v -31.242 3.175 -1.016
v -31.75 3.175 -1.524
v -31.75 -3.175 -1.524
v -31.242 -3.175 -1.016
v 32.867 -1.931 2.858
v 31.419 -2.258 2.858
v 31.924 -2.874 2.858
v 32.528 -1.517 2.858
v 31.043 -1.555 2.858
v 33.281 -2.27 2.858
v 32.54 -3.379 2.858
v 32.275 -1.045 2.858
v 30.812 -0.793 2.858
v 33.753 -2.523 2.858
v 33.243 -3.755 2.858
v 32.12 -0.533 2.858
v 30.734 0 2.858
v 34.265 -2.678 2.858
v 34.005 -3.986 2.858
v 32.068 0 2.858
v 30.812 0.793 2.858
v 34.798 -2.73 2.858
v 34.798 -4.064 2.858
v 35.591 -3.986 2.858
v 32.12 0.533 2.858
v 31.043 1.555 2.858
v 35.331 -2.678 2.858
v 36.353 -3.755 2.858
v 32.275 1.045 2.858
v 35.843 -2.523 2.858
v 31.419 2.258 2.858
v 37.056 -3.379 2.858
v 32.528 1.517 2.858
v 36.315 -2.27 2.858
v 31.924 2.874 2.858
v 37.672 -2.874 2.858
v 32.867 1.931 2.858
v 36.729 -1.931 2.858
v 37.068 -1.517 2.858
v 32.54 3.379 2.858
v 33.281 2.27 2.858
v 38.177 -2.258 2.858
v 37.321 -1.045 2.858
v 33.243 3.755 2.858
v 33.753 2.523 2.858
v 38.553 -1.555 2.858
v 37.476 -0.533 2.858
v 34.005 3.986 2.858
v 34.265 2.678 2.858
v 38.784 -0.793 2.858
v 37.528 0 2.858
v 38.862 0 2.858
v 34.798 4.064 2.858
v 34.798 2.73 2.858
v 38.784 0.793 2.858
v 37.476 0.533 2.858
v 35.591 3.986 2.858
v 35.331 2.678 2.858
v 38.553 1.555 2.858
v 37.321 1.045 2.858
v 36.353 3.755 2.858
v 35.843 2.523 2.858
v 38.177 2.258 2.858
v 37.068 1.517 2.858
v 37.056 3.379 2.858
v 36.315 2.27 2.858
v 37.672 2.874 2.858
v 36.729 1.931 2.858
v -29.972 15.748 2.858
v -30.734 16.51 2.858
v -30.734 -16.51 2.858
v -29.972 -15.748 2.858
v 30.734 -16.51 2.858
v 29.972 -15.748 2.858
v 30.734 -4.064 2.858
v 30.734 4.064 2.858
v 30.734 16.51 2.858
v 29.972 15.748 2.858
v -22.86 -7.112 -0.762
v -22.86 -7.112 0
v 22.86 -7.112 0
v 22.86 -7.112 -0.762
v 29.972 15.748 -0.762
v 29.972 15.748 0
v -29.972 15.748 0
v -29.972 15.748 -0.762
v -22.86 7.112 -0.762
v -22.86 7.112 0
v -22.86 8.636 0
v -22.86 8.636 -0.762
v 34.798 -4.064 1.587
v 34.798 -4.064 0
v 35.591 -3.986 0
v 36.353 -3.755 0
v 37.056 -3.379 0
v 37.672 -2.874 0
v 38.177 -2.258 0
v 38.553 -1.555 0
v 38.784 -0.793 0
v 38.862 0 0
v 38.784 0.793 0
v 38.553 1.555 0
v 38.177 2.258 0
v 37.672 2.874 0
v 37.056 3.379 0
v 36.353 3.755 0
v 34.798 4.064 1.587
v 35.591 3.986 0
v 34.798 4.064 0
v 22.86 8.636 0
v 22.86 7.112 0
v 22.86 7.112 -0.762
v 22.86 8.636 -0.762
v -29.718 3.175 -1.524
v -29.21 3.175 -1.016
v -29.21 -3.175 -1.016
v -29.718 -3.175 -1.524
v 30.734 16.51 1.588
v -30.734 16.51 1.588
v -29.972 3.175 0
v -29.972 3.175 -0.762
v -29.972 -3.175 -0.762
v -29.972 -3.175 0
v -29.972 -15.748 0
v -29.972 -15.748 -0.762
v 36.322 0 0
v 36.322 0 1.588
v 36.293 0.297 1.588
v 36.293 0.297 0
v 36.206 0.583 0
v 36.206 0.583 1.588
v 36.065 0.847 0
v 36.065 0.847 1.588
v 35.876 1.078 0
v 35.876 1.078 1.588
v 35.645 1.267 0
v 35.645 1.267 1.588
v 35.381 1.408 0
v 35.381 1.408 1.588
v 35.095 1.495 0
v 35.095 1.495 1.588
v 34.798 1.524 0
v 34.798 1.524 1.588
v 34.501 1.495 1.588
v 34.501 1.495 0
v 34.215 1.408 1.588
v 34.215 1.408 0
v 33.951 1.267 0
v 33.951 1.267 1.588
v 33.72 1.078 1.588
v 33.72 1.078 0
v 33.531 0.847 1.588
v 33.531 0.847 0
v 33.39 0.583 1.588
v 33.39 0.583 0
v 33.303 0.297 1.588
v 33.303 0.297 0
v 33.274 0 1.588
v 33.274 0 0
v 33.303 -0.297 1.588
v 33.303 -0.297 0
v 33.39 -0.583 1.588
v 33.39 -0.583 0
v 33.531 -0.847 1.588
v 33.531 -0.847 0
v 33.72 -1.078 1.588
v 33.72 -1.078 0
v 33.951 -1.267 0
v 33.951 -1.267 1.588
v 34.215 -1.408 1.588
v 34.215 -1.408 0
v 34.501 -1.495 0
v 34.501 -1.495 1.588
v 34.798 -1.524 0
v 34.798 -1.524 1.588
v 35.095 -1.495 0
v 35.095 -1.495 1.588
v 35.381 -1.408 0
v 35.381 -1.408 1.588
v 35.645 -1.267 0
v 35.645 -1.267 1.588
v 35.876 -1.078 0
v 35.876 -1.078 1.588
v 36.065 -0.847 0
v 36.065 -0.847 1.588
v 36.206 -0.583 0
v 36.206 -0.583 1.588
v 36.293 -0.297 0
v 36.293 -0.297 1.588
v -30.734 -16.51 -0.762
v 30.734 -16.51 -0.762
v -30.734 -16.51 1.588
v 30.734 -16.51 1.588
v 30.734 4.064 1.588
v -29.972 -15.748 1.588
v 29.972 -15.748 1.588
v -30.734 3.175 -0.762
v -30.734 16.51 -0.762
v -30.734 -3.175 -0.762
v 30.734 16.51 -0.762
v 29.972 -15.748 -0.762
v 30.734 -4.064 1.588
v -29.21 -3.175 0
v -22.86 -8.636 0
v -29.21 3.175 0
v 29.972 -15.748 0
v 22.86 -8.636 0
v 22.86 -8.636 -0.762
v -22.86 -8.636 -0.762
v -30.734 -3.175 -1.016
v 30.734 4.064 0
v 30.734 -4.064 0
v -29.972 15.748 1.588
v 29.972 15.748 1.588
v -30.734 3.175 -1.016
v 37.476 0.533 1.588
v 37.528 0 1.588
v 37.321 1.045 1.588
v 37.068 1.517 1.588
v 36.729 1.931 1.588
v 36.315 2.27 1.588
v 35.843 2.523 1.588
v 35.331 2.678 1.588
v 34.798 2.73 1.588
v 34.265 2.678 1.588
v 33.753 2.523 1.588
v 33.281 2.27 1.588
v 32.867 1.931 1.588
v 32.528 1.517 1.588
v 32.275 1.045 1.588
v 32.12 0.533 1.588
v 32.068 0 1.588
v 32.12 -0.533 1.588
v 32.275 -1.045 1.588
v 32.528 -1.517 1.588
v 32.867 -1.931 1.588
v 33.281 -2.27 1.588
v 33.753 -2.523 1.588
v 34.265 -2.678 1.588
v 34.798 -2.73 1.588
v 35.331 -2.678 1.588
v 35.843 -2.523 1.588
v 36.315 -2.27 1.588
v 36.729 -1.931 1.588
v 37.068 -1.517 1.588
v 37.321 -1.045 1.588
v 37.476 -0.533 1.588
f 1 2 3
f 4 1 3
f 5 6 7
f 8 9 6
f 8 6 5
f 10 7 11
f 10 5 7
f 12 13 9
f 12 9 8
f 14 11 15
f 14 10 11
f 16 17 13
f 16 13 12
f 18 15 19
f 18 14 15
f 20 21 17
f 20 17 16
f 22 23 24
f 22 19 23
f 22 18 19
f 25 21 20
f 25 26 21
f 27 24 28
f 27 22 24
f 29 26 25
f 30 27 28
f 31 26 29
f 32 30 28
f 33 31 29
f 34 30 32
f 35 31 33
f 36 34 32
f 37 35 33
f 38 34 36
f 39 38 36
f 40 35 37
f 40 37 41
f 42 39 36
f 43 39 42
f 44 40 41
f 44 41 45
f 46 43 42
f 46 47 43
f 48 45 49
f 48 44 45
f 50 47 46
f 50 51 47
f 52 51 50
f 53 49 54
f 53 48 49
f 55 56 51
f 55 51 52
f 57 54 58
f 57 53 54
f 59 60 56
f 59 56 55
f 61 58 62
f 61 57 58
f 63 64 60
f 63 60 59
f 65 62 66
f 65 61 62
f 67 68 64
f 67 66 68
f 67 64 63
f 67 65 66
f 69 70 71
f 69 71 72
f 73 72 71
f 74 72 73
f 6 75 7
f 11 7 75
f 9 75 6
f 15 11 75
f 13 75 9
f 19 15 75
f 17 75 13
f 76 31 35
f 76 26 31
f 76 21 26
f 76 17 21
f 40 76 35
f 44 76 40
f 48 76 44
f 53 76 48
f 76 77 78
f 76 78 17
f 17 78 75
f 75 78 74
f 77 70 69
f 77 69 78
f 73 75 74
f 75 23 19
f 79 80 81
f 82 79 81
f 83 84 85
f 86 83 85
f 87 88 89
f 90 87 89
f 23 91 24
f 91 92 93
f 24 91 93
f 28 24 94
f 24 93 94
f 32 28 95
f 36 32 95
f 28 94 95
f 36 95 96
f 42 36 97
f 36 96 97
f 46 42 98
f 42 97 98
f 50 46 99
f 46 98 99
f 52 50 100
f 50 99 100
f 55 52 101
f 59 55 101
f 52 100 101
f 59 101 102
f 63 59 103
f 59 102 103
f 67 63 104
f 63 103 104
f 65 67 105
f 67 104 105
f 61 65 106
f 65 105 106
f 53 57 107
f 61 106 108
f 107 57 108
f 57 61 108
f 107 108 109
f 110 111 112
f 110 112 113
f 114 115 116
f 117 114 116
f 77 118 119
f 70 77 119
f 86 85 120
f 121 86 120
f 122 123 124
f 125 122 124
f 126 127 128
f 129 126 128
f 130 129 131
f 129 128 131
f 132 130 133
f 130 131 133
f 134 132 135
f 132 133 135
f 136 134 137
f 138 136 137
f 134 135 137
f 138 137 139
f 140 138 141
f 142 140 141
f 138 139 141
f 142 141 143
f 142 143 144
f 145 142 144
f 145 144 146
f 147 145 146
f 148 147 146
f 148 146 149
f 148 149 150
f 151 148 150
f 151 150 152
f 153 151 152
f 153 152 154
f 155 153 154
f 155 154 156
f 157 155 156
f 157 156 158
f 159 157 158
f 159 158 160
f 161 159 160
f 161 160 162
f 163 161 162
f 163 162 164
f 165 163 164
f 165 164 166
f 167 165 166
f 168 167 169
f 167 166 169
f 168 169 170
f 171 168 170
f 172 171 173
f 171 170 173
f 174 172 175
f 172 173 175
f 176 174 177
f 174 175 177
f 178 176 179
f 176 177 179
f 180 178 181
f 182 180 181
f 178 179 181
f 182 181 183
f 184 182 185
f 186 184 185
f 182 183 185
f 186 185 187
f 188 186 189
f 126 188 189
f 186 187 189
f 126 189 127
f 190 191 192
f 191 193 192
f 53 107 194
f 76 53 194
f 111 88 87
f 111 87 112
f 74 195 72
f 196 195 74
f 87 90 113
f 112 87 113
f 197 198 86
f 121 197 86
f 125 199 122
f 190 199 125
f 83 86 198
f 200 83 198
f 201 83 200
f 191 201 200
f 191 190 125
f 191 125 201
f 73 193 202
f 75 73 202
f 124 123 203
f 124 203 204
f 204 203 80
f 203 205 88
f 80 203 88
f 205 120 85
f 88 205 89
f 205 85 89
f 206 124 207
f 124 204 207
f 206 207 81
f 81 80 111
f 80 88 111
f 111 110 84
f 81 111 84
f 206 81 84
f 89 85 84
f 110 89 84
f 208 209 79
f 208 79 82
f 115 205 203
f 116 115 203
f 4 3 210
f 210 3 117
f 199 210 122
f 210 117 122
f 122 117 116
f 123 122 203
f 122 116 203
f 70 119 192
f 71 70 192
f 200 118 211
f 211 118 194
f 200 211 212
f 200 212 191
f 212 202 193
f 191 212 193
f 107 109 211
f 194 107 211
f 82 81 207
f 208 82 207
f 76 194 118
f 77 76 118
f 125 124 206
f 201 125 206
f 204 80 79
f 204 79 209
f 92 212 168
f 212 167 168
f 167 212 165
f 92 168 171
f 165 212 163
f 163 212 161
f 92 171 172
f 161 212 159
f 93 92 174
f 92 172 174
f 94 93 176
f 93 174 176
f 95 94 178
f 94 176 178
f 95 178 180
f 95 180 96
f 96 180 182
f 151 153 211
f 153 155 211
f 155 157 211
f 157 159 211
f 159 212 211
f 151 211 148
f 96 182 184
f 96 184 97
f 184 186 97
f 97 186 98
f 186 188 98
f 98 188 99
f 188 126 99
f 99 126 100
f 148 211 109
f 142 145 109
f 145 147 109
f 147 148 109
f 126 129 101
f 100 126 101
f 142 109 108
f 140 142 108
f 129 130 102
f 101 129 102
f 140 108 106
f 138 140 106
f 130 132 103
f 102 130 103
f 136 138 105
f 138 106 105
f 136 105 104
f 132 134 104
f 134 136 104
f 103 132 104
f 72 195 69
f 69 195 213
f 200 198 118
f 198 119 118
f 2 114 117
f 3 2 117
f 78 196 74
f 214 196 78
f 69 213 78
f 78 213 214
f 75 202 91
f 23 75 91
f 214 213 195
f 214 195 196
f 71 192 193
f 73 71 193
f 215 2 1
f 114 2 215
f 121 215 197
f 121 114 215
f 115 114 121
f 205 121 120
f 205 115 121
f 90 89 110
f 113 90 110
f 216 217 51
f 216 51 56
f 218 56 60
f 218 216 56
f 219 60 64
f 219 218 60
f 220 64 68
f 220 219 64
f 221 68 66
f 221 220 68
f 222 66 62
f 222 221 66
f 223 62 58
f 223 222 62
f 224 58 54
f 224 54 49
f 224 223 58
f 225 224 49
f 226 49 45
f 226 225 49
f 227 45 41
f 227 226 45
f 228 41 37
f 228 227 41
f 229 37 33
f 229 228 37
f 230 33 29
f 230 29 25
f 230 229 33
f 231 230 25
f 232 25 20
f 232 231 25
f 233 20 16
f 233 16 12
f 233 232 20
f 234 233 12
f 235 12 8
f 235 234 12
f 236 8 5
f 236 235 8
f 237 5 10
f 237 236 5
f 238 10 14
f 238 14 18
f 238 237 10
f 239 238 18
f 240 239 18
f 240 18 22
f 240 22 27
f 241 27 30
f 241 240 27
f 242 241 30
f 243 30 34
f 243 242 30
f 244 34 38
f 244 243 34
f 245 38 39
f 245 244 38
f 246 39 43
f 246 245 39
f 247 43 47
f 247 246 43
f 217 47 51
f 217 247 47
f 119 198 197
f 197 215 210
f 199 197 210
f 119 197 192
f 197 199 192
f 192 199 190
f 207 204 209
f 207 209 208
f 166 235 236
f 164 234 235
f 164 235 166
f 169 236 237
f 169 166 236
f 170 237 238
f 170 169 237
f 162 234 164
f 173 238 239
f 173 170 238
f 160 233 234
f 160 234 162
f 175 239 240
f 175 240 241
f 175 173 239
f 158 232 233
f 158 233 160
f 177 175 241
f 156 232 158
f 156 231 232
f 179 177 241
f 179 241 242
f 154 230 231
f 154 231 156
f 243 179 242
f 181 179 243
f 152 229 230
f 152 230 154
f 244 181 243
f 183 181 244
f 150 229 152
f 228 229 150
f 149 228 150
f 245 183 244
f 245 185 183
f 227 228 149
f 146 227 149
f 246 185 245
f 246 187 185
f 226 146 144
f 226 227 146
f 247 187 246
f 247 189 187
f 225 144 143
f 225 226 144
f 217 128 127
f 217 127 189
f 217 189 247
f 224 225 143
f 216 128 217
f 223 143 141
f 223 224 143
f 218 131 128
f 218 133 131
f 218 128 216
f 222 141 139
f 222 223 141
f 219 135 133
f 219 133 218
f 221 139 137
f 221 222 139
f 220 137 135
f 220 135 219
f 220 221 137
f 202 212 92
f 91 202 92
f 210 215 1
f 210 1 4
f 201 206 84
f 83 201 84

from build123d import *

# Parameters (mm, degrees)
F1_DEPTH  = 1.5875
F2_R      = 1.524
F3_DEPTH  = 1.5885
F4_R      = 2.7305
F5_DEPTH  = 1.27
F6_W      = 1.524
F6_H      = 6.35
F7_DEPTH  = 1.524
F8_W      = 6.35
F8_H      = 0.508
F9_DEPTH  = 1.016
F10_SIZE  = 0.50799
F12_DEPTH = 0.762
F13_W     = 59.944
F13_H     = 31.496
F14_DEPTH = 1.27
F15_W     = 45.72
F15_H     = 1.524
F16_DEPTH = 0.762


# Not quite as in the source:
# - a fillet or chamfer is up to 0.001 mm smaller than in the source, because OpenCascade refuses the exact size
# - a pattern or mirror of a feature is missing from the dataset's text; its kind, count and spacing are read off the source's solid


with BuildPart() as f1:
    # F0 (on Top) → F1 (new body)
    with BuildSketch(Plane.XY):
        Polygon((-30.734, -16.51), (30.734, -16.51), (30.734, -4.064), (30.734, 4.064), (30.734, 16.51), (-30.734, 16.51), align=None)
        with BuildLine():
            Line((30.734, 4.064), (30.734, -4.064))
            Line((30.734, -4.064), (34.798, -4.064))
            ThreePointArc((34.798, -4.064), (37.6716819587, -2.8736819587), (38.862, 0))
            ThreePointArc((38.862, 0), (37.6716819587, 2.8736819587), (34.798, 4.064))
            Line((34.798, 4.064), (30.734, 4.064))
        make_face()
    extrude(amount=F1_DEPTH)

    # F2 (on face) → F3 (cut, through all)
    with BuildSketch(Plane.XY.offset(1.5875)):
        with Locations((34.798, 0)):
            Circle(F2_R)
    extrude(amount=-F3_DEPTH, mode=Mode.SUBTRACT)

    # F4 (on face) → F5 (join)
    with BuildSketch(Plane.XY.offset(1.5875)):
        with BuildLine():
            ThreePointArc((34.798, -4.064), (37.6716819587, -2.8736819587), (38.862, 0))
            ThreePointArc((38.862, 0), (37.6716819587, 2.8736819587), (34.798, 4.064))
            ThreePointArc((34.798, 4.064), (30.734, 0), (34.798, -4.064))
        make_face()
        with Locations((34.798, 0)):
            Circle(F4_R, mode=Mode.SUBTRACT)
    extrude(amount=F5_DEPTH)

    # F6 (on face) → F7 (join)
    with BuildSketch(Plane(origin=(0, 0, 0), x_dir=(1, 0, 0), z_dir=(0, 0, -1))):
        with Locations((-29.972, 0)):
            Rectangle(F6_W, F6_H)
    extrude(amount=F7_DEPTH)

    # F8 (on face) → F9 (join)
    with BuildSketch(Plane(origin=(-30.734, 0, 0), x_dir=(0, -1, 0), z_dir=(-1, 0, 0))):
        with Locations((0, -1.27)):
            Rectangle(F8_W, F8_H)
    extrude(amount=F9_DEPTH)

    # F10 (size 0.508 in the source; OpenCascade refuses exactly that, so slightly less here)
    f10_edges = [f1.edges().sort_by_distance(p)[0] for p in [
        (-31.75, 0, -1.016),
        (-29.21, 0, -1.524),
    ]]
    chamfer(f10_edges, length=F10_SIZE)

    # F11 (on face) → F12 (join)
    with BuildSketch(Plane(origin=(0, 0, 0), x_dir=(1, 0, 0), z_dir=(0, 0, -1))):
        Polygon((-29.972, 3.175), (-29.972, 15.748), (29.972, 15.748), (29.972, -15.748), (-29.972, -15.748), (-29.972, -3.175), (-30.734, -3.175), (-30.734, -16.51), (30.734, -16.51), (30.734, -4.064), (30.734, 4.064), (30.734, 16.51), (-30.734, 16.51), (-30.734, 3.175), align=None)
    extrude(amount=F12_DEPTH)

    # F13 (on face) → F14 (join, through all)
    with BuildSketch(Plane.XY.offset(1.5875)):
        with BuildLine():
            ThreePointArc((34.798, -4.064), (31.9243180414, -2.8736819589), (30.734, -4e-10))
            Line((30.734, -4e-10), (30.734, -4.064))
            Line((30.734, -4.064), (34.798, -4.064))
        make_face()
        with BuildLine():
            Line((34.798, 4.064), (30.734, 4.064))
            Line((30.734, 4.064), (30.734, -4e-10))
            ThreePointArc((30.734, -4e-10), (31.9243180411, 2.8736819586), (34.798, 4.064))
        make_face()
        Polygon((30.734, 16.51), (-30.734, 16.51), (-30.734, -16.51), (30.734, -16.51), (30.734, -4.064), (30.734, -4e-10), (30.734, 4.064), align=None)
        Rectangle(F13_W, F13_H, mode=Mode.SUBTRACT)
    extrude(amount=F14_DEPTH)

    # F15 (on face) → F16 (join)
    with BuildSketch(Plane(origin=(0, 0, 0), x_dir=(1, 0, 0), z_dir=(0, 0, -1))):
        with Locations((0, 7.874)):
            Rectangle(F15_W, F15_H)
    f16 = extrude(amount=F16_DEPTH)

    # F16_copies: F16 across plane
    add(f16.mirror(Plane.ZX))


solid = f1.part
